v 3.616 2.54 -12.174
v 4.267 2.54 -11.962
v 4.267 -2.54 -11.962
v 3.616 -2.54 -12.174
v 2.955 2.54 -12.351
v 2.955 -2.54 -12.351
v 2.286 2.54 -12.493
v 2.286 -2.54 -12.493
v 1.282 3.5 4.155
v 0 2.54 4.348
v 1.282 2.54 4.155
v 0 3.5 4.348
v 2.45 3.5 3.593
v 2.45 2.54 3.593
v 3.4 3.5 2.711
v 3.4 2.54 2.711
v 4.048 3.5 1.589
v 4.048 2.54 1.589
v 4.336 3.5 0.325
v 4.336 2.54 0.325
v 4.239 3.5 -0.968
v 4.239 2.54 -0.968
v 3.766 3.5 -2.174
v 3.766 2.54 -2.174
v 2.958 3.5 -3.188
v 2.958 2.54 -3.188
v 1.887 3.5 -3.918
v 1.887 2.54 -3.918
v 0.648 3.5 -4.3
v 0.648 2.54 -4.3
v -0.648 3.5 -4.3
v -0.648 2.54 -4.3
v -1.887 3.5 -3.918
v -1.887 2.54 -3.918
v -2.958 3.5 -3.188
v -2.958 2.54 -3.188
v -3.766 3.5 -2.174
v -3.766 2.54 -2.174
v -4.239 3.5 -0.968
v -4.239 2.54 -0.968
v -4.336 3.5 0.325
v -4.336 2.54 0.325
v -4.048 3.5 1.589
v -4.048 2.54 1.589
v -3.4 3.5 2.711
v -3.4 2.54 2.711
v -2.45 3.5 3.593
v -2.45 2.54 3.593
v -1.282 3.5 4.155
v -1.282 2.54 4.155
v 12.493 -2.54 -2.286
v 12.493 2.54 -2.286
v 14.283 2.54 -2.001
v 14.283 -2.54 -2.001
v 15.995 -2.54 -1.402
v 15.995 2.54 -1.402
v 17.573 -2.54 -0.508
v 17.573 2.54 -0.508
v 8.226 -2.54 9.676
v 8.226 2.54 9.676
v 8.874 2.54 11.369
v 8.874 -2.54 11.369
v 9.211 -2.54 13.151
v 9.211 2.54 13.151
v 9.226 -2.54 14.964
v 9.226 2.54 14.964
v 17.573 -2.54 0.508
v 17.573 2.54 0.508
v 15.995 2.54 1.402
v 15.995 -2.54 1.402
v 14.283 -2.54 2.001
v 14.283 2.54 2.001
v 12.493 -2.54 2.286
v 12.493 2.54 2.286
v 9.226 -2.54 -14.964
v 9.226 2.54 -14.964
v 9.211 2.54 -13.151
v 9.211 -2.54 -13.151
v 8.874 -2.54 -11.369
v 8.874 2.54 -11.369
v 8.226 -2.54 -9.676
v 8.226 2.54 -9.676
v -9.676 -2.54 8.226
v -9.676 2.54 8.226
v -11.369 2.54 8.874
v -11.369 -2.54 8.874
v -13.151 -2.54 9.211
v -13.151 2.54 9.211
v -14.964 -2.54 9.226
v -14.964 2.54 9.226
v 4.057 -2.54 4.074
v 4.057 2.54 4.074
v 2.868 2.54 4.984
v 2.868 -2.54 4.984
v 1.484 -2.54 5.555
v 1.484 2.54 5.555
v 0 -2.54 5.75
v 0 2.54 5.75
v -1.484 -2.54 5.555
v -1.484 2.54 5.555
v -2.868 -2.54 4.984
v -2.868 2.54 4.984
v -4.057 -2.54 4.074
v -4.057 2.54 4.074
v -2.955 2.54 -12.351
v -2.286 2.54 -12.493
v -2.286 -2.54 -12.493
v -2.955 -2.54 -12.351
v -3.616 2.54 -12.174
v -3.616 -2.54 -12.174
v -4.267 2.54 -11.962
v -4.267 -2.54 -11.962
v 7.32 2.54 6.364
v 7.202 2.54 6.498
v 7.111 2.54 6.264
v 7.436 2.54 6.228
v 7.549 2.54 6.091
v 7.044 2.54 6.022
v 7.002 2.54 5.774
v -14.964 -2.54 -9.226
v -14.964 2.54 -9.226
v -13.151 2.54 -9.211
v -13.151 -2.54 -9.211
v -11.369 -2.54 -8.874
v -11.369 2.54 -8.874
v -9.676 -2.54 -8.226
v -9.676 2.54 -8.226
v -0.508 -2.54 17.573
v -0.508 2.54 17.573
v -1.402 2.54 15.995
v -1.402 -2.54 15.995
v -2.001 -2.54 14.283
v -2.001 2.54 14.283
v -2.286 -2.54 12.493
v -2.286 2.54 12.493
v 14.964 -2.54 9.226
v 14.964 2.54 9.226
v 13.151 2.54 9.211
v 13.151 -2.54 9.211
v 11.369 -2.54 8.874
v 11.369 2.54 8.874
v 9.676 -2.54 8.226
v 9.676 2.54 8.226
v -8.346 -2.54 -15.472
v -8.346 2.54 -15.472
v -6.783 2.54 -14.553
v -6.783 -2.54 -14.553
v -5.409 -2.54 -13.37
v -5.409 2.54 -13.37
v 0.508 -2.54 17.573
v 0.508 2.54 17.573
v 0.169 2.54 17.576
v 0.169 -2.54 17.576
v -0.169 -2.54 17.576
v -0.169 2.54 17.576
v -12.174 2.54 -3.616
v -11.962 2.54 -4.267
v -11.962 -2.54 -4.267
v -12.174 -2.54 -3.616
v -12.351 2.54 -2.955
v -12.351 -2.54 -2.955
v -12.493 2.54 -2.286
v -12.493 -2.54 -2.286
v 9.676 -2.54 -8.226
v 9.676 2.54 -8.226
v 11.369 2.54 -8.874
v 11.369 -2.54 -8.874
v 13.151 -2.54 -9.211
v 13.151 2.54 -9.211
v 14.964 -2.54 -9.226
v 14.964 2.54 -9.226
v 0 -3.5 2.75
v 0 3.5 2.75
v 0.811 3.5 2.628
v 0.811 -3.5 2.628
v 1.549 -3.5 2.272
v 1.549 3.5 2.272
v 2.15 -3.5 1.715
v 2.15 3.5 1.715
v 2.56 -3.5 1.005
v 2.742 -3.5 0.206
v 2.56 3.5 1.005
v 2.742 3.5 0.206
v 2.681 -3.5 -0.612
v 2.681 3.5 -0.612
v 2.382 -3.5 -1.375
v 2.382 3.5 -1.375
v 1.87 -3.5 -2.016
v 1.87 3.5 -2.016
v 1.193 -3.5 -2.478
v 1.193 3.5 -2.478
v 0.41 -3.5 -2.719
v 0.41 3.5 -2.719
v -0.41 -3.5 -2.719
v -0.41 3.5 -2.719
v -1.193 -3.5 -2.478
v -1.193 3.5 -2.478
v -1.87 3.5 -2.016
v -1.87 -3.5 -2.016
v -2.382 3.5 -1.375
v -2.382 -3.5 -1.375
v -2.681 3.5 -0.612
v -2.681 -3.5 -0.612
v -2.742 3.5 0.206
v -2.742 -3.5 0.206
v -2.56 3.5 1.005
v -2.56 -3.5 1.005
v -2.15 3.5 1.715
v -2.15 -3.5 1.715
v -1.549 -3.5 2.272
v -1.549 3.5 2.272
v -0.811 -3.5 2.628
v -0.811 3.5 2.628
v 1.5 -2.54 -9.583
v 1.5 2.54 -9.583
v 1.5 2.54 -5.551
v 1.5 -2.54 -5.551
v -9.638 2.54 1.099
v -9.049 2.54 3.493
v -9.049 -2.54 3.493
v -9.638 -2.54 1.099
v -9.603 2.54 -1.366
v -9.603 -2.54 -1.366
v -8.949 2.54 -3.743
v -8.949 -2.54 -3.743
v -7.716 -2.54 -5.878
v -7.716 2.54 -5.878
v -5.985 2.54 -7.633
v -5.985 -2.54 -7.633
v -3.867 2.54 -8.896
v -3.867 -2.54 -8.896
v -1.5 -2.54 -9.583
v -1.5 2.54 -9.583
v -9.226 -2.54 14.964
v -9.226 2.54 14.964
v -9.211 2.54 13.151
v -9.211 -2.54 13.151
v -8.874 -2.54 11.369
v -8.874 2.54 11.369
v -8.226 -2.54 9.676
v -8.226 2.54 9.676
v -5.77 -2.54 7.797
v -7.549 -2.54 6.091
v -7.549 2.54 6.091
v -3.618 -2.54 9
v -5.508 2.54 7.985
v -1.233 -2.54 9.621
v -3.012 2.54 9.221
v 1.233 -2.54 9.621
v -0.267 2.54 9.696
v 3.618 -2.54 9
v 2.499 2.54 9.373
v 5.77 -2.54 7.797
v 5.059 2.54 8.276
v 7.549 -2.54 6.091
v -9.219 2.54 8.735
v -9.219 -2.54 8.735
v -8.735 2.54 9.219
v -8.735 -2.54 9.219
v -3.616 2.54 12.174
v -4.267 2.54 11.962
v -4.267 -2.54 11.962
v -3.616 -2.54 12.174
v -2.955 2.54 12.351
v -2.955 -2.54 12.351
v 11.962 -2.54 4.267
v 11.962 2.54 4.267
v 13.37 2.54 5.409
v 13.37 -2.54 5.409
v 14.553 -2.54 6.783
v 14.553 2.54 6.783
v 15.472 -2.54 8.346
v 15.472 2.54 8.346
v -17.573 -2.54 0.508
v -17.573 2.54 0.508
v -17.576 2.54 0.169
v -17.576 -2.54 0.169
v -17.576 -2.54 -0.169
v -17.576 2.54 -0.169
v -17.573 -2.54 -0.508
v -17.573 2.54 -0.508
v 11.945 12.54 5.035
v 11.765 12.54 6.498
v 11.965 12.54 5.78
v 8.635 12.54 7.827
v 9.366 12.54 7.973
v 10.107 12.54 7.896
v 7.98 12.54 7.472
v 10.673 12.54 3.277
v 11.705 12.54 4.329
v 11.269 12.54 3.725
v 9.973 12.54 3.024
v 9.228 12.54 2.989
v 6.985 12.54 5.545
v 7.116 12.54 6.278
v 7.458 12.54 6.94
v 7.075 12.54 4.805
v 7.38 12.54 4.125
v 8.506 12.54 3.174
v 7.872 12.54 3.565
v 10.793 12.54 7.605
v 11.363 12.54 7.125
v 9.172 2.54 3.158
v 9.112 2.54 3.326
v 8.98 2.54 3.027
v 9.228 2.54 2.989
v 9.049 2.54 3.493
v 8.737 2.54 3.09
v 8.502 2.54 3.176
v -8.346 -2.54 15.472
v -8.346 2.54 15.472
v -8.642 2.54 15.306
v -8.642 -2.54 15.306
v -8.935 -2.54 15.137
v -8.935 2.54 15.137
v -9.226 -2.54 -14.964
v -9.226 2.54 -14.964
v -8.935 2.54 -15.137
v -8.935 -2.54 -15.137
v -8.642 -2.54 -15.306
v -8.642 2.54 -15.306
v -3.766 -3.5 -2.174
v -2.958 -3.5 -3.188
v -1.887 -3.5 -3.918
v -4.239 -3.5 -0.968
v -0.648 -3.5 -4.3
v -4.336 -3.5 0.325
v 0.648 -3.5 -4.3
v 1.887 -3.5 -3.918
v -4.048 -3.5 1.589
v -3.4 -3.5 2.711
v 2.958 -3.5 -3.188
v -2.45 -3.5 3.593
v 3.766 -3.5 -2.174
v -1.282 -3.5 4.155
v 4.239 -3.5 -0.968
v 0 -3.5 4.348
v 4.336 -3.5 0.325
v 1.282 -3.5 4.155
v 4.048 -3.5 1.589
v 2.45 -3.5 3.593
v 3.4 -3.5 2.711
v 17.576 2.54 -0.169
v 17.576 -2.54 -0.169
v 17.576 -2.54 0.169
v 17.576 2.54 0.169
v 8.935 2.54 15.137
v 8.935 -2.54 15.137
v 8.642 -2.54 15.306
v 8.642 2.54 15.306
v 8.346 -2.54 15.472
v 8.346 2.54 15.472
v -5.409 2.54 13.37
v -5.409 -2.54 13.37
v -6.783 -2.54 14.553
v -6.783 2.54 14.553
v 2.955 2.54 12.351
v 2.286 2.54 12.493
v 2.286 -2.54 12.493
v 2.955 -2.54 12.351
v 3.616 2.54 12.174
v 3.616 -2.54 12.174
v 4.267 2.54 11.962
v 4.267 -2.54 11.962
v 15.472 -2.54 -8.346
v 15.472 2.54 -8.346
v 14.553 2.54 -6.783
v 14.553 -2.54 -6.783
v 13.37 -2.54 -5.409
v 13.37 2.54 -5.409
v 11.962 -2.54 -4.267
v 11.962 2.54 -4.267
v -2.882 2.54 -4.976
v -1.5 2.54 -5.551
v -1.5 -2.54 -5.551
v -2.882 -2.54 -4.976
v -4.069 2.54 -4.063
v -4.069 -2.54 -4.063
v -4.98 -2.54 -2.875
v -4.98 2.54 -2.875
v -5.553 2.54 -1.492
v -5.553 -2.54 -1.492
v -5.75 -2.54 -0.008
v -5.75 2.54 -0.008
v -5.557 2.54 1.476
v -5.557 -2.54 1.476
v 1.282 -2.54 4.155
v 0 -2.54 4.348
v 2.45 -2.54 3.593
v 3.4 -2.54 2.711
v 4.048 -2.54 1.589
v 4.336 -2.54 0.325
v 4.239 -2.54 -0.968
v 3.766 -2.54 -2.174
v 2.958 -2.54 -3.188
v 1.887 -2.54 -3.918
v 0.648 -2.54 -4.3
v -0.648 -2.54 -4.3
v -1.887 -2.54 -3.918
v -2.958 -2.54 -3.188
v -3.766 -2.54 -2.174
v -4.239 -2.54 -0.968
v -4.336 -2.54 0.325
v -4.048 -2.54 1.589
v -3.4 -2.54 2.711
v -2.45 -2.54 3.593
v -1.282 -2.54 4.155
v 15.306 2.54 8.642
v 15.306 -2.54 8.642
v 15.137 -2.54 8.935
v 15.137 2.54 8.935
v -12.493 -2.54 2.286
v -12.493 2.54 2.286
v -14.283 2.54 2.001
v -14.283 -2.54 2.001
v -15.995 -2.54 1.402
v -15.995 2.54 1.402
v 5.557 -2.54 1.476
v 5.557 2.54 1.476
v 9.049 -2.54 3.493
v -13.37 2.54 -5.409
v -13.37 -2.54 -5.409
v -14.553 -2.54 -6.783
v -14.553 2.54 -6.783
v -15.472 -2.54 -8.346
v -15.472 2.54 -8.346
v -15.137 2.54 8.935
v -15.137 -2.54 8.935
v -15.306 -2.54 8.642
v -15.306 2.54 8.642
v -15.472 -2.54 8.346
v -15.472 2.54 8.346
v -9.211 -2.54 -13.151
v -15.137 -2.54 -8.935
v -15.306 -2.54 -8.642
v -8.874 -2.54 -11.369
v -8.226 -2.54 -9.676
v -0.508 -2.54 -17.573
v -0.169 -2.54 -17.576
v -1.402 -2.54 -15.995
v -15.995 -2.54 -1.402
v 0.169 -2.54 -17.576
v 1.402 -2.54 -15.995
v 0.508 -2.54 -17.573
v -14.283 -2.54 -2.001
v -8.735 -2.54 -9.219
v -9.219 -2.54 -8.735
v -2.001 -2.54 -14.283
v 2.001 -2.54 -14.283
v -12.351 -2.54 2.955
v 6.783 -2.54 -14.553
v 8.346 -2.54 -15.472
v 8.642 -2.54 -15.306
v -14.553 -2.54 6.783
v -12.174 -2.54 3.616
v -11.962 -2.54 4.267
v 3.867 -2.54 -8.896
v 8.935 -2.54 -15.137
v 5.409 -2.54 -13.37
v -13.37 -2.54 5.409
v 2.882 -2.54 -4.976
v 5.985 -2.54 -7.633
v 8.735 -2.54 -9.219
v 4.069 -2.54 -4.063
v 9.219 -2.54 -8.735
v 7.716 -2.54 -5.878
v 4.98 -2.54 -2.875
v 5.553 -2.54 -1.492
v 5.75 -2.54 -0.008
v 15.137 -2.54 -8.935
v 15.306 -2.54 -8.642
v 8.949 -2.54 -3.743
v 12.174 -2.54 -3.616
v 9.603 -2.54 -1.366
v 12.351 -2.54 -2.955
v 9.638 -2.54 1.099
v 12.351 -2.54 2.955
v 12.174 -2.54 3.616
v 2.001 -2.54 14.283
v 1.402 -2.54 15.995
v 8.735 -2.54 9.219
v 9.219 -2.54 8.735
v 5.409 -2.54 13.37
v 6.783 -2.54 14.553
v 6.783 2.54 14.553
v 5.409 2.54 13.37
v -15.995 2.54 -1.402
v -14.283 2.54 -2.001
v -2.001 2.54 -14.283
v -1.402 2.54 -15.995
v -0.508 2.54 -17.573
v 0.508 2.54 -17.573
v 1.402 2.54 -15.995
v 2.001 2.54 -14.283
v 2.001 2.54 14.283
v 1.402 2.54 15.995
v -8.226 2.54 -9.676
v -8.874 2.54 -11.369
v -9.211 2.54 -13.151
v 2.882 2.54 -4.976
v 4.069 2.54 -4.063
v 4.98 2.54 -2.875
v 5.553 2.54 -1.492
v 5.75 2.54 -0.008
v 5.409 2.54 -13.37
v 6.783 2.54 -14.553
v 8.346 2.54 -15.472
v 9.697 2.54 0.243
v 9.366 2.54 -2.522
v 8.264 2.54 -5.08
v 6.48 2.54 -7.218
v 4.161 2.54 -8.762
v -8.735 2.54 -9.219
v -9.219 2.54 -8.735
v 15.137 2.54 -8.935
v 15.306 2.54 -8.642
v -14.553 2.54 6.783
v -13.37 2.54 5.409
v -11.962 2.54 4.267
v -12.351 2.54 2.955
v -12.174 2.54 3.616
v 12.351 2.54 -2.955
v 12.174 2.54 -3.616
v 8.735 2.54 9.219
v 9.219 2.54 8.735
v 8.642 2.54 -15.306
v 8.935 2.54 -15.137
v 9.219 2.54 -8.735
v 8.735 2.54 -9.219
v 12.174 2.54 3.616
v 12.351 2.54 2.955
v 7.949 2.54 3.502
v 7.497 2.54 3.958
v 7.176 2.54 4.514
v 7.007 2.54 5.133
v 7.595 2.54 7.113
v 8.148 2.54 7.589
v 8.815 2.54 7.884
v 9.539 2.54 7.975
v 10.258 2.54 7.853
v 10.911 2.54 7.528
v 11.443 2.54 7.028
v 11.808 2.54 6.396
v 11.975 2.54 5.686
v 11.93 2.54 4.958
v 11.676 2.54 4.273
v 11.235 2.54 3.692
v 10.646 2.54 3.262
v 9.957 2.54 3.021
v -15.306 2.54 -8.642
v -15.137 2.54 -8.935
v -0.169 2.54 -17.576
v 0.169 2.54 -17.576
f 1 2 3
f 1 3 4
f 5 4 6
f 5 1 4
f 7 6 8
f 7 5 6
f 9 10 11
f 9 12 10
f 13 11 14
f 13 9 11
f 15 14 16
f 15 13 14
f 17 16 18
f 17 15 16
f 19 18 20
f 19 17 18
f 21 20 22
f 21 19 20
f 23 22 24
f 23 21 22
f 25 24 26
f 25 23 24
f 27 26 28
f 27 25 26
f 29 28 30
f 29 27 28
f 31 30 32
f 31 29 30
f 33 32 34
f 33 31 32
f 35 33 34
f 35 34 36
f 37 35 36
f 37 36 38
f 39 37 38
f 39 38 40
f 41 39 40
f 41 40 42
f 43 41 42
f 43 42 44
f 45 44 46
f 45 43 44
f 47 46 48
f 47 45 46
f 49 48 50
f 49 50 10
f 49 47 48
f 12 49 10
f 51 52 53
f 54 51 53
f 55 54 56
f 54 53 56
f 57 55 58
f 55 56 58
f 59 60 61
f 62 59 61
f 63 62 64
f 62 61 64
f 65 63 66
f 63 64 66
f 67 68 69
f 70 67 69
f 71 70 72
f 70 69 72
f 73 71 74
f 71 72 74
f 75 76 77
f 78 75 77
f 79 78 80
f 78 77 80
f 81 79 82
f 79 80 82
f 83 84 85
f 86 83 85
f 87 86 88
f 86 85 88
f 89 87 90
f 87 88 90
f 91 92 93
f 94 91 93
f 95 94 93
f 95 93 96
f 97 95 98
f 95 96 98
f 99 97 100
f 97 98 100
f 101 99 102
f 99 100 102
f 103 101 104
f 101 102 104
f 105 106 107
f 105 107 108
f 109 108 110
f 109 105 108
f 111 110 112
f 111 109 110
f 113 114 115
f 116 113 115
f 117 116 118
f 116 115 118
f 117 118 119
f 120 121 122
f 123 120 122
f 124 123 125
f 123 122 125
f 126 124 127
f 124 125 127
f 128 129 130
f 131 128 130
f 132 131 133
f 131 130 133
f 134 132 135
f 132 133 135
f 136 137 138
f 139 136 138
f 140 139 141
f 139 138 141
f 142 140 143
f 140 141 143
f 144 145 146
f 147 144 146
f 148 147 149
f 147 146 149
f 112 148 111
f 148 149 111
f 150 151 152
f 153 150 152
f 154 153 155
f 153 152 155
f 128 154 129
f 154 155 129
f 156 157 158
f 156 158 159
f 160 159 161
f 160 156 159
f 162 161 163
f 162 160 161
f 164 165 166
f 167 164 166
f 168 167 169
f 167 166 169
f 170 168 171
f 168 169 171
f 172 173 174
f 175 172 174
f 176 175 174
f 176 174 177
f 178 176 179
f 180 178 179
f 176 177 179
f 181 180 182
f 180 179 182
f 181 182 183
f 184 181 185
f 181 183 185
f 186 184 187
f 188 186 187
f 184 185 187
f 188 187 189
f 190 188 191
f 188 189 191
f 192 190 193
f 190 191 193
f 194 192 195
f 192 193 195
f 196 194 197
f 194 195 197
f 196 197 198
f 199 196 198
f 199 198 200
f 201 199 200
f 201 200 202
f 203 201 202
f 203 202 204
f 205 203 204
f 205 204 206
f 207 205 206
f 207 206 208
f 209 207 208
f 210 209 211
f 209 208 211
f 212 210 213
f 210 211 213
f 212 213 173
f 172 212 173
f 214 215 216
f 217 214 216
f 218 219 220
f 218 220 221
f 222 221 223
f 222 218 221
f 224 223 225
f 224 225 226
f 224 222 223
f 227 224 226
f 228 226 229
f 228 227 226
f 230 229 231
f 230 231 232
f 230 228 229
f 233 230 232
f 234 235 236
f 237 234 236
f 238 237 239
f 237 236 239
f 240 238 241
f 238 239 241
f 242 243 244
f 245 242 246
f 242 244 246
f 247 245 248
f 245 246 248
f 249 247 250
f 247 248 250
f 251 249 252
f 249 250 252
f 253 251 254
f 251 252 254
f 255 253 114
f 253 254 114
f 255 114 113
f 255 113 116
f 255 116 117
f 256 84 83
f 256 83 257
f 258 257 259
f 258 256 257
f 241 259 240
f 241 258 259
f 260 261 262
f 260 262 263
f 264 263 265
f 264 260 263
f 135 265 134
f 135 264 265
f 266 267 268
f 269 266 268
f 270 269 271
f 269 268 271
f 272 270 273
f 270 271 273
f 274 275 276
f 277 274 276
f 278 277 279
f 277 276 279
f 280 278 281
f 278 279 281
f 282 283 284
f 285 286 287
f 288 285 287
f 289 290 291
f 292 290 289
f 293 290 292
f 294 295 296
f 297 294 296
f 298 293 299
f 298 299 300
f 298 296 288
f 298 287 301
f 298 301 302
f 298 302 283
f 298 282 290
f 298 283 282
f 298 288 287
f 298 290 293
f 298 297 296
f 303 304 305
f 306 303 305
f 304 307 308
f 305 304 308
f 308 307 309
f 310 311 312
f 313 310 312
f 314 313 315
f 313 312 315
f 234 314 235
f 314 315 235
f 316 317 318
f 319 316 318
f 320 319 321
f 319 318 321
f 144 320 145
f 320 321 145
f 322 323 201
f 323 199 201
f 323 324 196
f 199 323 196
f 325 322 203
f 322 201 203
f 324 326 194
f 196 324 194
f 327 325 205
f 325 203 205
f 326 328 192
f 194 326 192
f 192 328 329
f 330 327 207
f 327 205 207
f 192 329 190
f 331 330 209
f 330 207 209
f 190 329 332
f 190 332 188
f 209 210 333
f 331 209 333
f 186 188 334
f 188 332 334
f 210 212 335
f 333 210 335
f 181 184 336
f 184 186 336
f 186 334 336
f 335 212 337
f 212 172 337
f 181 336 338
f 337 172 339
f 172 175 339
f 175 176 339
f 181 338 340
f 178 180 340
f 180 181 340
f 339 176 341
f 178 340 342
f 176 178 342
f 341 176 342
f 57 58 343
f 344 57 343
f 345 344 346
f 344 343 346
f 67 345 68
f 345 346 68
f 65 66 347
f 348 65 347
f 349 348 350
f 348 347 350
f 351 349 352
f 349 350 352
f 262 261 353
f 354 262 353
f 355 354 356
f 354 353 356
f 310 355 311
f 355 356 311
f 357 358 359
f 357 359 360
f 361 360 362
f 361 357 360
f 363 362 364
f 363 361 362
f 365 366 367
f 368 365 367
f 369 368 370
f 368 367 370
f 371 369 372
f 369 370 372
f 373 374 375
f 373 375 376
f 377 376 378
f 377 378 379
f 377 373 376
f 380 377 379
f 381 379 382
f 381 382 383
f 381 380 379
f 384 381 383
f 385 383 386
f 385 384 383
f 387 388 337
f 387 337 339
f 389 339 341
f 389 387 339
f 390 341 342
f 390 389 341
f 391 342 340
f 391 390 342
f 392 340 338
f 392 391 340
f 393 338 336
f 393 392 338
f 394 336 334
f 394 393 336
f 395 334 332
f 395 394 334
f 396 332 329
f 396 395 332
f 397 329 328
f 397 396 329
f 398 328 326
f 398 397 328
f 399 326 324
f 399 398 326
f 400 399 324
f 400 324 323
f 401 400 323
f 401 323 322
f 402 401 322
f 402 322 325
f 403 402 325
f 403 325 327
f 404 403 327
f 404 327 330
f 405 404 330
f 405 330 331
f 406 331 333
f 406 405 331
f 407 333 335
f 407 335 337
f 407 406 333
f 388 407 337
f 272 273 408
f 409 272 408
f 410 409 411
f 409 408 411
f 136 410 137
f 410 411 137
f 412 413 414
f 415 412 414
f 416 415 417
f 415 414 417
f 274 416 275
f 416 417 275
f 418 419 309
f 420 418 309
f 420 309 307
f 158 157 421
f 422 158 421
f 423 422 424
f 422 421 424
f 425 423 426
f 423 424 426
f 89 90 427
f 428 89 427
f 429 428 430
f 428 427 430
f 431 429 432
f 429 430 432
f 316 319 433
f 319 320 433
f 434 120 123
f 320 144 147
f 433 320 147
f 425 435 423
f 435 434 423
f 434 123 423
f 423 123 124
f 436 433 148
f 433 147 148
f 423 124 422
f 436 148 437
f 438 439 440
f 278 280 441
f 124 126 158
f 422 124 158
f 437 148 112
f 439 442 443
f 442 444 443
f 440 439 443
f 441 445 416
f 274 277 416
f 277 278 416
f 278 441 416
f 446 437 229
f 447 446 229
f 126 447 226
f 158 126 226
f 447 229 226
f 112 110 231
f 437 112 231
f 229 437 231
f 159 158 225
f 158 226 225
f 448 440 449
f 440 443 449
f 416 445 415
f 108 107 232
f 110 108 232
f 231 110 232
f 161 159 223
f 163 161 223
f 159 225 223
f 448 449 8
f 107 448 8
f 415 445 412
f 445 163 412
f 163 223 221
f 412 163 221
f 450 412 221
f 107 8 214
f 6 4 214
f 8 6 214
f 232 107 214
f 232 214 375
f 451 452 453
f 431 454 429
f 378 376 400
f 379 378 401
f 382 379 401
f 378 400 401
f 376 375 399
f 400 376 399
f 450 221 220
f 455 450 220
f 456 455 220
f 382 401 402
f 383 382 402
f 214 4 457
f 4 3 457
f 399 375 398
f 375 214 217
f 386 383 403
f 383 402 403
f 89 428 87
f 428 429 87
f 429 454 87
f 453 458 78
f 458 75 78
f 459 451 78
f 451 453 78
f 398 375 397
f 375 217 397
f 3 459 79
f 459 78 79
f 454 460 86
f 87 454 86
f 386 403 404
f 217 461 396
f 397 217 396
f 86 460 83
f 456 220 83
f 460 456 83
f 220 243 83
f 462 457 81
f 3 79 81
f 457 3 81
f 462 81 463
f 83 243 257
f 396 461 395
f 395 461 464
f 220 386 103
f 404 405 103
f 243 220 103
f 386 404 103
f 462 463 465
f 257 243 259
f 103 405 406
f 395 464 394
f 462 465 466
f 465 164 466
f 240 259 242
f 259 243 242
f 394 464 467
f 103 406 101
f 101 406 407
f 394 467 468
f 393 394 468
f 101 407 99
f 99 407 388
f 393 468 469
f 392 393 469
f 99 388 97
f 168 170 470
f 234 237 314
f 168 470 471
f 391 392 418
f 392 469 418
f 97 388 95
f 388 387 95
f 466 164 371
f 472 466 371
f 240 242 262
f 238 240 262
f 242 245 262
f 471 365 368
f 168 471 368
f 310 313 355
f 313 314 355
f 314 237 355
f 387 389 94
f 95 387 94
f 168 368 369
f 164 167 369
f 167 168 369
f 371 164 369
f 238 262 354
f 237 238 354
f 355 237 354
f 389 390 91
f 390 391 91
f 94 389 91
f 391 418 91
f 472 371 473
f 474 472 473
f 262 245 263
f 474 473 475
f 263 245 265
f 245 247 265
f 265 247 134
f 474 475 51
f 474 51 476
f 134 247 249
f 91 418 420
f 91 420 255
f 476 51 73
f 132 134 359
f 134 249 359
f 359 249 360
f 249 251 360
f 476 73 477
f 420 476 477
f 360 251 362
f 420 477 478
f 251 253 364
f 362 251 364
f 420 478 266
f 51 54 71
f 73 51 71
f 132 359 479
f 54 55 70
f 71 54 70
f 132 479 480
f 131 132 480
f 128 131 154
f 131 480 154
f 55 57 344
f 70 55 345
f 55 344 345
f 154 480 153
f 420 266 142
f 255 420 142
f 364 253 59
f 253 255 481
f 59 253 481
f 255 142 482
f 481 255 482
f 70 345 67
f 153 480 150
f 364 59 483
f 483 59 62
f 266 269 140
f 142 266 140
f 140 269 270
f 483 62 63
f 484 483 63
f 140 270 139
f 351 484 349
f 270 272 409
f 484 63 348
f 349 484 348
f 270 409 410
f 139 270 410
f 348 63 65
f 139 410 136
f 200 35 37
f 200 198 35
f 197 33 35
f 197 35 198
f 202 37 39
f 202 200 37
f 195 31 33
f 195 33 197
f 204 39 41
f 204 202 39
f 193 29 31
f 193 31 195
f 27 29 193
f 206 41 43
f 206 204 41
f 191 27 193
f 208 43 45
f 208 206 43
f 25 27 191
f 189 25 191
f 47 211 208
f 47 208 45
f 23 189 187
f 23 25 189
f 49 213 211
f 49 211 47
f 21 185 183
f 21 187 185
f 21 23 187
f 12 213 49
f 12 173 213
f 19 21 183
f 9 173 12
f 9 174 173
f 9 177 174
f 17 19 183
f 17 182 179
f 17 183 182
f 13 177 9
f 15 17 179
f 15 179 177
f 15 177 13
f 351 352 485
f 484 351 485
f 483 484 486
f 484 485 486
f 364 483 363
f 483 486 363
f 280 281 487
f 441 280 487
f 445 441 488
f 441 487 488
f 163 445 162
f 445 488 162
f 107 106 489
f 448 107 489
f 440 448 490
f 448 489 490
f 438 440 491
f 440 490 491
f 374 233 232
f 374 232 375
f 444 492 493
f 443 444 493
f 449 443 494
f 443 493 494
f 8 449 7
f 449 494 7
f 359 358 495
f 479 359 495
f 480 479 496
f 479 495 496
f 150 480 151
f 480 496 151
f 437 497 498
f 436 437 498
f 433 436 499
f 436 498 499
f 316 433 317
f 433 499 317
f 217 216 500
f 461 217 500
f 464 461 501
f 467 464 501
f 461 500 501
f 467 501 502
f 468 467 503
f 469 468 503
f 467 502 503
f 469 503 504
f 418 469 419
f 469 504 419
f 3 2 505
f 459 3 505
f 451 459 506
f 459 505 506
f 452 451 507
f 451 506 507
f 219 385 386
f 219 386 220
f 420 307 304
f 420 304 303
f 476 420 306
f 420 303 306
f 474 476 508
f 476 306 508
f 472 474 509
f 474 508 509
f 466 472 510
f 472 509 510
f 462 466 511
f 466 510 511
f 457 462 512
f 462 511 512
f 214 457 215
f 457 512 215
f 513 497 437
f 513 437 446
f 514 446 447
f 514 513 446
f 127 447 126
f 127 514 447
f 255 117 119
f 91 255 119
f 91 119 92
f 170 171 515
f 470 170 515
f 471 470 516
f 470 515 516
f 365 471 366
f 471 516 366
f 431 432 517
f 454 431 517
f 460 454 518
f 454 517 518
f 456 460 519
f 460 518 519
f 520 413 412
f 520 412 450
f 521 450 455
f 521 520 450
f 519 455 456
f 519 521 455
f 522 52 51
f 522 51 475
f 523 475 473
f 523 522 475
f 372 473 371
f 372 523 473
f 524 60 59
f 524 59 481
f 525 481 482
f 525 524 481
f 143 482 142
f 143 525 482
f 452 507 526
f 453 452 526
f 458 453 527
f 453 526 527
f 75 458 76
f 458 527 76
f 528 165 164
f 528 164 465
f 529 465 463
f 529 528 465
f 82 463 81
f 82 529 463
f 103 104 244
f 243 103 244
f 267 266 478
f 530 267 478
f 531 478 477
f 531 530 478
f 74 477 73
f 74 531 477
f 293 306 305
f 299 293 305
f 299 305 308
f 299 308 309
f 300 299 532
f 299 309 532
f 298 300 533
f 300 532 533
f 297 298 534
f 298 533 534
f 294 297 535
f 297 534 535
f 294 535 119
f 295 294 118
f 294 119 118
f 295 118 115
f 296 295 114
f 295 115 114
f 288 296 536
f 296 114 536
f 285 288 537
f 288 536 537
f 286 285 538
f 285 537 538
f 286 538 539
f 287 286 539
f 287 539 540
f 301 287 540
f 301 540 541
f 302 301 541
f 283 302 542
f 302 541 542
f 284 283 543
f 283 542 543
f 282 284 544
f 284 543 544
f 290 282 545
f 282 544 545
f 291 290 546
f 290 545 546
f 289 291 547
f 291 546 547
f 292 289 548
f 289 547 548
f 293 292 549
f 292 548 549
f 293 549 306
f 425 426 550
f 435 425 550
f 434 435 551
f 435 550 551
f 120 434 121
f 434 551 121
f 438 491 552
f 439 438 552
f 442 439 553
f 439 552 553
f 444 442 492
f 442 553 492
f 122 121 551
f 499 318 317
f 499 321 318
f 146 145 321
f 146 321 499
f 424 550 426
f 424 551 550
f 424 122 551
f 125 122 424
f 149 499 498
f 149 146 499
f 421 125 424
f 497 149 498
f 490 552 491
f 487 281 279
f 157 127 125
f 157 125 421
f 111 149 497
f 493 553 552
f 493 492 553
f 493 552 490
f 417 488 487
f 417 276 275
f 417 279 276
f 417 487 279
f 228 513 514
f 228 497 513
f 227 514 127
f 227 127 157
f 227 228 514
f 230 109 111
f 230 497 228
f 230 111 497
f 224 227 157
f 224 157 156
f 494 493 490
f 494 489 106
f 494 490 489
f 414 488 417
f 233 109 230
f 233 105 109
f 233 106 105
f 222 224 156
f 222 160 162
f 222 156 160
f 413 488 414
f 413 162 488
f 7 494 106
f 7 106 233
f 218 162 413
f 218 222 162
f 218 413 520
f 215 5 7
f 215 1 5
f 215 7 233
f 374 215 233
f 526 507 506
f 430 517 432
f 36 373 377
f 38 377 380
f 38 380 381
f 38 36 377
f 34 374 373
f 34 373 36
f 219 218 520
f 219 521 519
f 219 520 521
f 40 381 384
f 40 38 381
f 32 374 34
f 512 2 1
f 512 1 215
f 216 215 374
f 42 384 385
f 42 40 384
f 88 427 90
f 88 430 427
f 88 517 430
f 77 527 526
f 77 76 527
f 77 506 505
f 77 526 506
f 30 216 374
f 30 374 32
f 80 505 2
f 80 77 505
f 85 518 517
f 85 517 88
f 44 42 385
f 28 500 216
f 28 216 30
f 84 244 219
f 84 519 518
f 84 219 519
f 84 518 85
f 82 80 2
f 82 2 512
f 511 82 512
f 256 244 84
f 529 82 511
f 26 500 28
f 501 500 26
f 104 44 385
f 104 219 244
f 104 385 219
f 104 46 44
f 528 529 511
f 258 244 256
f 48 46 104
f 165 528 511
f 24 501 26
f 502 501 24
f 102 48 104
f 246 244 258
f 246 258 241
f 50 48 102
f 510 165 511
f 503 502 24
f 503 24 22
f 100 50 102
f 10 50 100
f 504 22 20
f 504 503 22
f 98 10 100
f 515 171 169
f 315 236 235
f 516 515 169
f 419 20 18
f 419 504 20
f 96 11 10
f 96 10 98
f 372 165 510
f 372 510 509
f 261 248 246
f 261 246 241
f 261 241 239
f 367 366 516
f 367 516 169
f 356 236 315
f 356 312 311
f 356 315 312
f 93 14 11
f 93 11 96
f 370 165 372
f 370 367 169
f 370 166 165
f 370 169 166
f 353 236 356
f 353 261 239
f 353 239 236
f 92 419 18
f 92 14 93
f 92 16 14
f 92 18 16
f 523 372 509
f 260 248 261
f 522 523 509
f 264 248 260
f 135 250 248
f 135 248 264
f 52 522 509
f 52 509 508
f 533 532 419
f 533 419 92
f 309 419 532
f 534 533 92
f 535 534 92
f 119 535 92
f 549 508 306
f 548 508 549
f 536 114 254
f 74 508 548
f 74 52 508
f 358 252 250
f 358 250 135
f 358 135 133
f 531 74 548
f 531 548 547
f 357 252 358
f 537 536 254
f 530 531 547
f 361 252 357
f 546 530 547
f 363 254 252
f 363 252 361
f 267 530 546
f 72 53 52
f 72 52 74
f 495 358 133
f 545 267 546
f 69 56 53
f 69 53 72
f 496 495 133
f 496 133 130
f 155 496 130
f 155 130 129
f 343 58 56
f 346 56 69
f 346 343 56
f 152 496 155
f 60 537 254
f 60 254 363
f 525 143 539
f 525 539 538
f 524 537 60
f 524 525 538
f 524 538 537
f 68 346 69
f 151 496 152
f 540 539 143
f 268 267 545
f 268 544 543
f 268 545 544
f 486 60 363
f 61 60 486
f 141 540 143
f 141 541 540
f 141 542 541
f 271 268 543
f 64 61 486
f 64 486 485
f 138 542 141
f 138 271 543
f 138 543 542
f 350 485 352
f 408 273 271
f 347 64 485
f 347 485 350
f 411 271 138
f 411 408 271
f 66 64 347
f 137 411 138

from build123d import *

# Parameters (mm, degrees)
BASE_PROFILE_R          = 12.7
GEAR_BASE_DEPTH         = 2.54
GEAR_START              = 2.54
GEAR_TOOTH_DEPTH        = 5.08
PATTERN_TOOTH_12T_COUNT = 12
LIP_PROFILE_R           = 4.348362351
LIP_DEPTH               = 3.5
SHAFT_START             = 0.96
HOLE_PROFILE_R          = 2.75
SHAFT_HOLE_DEPTH        = 7
GEAR_CUTOUT_DEPTH       = 5.08
HANDLE_PROFILE_R        = 2.5
HANDLE_DEPTH            = 10


with BuildPart() as part:
    # Base Profile → Gear Base (new, symmetric)
    with BuildSketch(Plane(origin=(0, 0, 0), x_dir=(1, 0, 0), z_dir=(0, 1, 0))):
        with Locations(Location((0, 0, 0), (0, 0, 270))):
            Circle(BASE_PROFILE_R)
    extrude(amount=GEAR_BASE_DEPTH, both=True)

    # Tooth Profile → Gear Tooth (add)
    with BuildSketch(Plane(origin=(0, 0, 0), x_dir=(1, 0, 0), z_dir=(0, 1, 0)).offset(GEAR_START)):
        with BuildLine():
            ThreePointArc((-2.286, 12.492565949), (-1.739501602, 15.15244151), (-0.508, 17.572565949))
            ThreePointArc((-0.508, 17.572565949), (0, 17.576799577), (0.508, 17.572565949))
            ThreePointArc((0.508, 17.572565949), (1.739501602, 15.15244151), (2.286, 12.492565949))
            ThreePointArc((2.286, 12.492565949), (0, 12.7), (-2.286, 12.492565949))
        make_face()
    gear_tooth = extrude(amount=-GEAR_TOOTH_DEPTH)

    # Pattern Tooth (12T): Gear Tooth ×12 about axis
    pattern_tooth_12t_axis = Axis((0, 0, 0), (0, 1, 0))
    for i in range(1, PATTERN_TOOTH_12T_COUNT):
        add(gear_tooth.rotate(pattern_tooth_12t_axis, i * 360 / PATTERN_TOOTH_12T_COUNT))

    # Lip Profile → Lip (add, symmetric)
    with BuildSketch(Plane(origin=(0, 0, 0), x_dir=(1, 0, 0), z_dir=(0, 1, 0))):
        with Locations(Location((0, 0, 0), (0, 0, 270))):
            Circle(LIP_PROFILE_R)
    extrude(amount=LIP_DEPTH, both=True)

    # Hole Profile → Shaft Hole (cut)
    with BuildSketch(Plane(origin=(0, 2.54, 0), x_dir=(1, 0, 0), z_dir=(0, 1, 0)).offset(SHAFT_START)):
        with Locations(Location((0, 0, 0), (0, 0, 270))):
            Circle(HOLE_PROFILE_R)
    extrude(amount=-SHAFT_HOLE_DEPTH, mode=Mode.SUBTRACT)

    # Cutout Profile → Gear Cutout (cut)
    with BuildSketch(Plane(origin=(0, 2.54, 0), x_dir=(1, 0, 0), z_dir=(0, 1, 0))):
        with BuildLine():
            Line((-1.5, 9.583318841), (-1.5, 5.550900828))
            ThreePointArc((-1.5, 5.550900828), (-4.979646072, 2.875), (-5.557221131, -1.476412308))
            Line((-5.557221131, -1.476412308), (-9.049397568, -3.492621315))
            ThreePointArc((-9.049397568, -3.492621315), (-8.400446417, 4.85), (-1.5, 9.583318841))
        make_face()
        with BuildLine():
            Line((1.5, 9.583318841), (1.5, 5.550900828))
            ThreePointArc((1.5, 5.550900828), (4.979646072, 2.875), (5.557221131, -1.476412308))
            Line((5.557221131, -1.476412308), (9.049397568, -3.492621315))
            ThreePointArc((9.049397568, -3.492621315), (8.400446417, 4.85), (1.5, 9.583318841))
        make_face()
        with BuildLine():
            Line((7.549397568, -6.090697526), (4.057221131, -4.07448852))
            ThreePointArc((4.057221131, -4.07448852), (0, -5.75), (-4.057221131, -4.07448852))
            Line((-4.057221131, -4.07448852), (-7.549397568, -6.090697526))
            ThreePointArc((-7.549397568, -6.090697526), (0, -9.7), (7.549397568, -6.090697526))
        make_face()
    extrude(amount=-GEAR_CUTOUT_DEPTH, mode=Mode.SUBTRACT)

    # Handle Profile → Handle (add)
    with BuildSketch(Plane(origin=(0, 2.54, 0), x_dir=(1, 0, 0), z_dir=(0, 1, 0))):
        with Locations(Location((9.483758311, -5.475450414, 0), (0, 0, 95.868617156))):
            Circle(HANDLE_PROFILE_R)
    extrude(amount=HANDLE_DEPTH)


solid = part.part
